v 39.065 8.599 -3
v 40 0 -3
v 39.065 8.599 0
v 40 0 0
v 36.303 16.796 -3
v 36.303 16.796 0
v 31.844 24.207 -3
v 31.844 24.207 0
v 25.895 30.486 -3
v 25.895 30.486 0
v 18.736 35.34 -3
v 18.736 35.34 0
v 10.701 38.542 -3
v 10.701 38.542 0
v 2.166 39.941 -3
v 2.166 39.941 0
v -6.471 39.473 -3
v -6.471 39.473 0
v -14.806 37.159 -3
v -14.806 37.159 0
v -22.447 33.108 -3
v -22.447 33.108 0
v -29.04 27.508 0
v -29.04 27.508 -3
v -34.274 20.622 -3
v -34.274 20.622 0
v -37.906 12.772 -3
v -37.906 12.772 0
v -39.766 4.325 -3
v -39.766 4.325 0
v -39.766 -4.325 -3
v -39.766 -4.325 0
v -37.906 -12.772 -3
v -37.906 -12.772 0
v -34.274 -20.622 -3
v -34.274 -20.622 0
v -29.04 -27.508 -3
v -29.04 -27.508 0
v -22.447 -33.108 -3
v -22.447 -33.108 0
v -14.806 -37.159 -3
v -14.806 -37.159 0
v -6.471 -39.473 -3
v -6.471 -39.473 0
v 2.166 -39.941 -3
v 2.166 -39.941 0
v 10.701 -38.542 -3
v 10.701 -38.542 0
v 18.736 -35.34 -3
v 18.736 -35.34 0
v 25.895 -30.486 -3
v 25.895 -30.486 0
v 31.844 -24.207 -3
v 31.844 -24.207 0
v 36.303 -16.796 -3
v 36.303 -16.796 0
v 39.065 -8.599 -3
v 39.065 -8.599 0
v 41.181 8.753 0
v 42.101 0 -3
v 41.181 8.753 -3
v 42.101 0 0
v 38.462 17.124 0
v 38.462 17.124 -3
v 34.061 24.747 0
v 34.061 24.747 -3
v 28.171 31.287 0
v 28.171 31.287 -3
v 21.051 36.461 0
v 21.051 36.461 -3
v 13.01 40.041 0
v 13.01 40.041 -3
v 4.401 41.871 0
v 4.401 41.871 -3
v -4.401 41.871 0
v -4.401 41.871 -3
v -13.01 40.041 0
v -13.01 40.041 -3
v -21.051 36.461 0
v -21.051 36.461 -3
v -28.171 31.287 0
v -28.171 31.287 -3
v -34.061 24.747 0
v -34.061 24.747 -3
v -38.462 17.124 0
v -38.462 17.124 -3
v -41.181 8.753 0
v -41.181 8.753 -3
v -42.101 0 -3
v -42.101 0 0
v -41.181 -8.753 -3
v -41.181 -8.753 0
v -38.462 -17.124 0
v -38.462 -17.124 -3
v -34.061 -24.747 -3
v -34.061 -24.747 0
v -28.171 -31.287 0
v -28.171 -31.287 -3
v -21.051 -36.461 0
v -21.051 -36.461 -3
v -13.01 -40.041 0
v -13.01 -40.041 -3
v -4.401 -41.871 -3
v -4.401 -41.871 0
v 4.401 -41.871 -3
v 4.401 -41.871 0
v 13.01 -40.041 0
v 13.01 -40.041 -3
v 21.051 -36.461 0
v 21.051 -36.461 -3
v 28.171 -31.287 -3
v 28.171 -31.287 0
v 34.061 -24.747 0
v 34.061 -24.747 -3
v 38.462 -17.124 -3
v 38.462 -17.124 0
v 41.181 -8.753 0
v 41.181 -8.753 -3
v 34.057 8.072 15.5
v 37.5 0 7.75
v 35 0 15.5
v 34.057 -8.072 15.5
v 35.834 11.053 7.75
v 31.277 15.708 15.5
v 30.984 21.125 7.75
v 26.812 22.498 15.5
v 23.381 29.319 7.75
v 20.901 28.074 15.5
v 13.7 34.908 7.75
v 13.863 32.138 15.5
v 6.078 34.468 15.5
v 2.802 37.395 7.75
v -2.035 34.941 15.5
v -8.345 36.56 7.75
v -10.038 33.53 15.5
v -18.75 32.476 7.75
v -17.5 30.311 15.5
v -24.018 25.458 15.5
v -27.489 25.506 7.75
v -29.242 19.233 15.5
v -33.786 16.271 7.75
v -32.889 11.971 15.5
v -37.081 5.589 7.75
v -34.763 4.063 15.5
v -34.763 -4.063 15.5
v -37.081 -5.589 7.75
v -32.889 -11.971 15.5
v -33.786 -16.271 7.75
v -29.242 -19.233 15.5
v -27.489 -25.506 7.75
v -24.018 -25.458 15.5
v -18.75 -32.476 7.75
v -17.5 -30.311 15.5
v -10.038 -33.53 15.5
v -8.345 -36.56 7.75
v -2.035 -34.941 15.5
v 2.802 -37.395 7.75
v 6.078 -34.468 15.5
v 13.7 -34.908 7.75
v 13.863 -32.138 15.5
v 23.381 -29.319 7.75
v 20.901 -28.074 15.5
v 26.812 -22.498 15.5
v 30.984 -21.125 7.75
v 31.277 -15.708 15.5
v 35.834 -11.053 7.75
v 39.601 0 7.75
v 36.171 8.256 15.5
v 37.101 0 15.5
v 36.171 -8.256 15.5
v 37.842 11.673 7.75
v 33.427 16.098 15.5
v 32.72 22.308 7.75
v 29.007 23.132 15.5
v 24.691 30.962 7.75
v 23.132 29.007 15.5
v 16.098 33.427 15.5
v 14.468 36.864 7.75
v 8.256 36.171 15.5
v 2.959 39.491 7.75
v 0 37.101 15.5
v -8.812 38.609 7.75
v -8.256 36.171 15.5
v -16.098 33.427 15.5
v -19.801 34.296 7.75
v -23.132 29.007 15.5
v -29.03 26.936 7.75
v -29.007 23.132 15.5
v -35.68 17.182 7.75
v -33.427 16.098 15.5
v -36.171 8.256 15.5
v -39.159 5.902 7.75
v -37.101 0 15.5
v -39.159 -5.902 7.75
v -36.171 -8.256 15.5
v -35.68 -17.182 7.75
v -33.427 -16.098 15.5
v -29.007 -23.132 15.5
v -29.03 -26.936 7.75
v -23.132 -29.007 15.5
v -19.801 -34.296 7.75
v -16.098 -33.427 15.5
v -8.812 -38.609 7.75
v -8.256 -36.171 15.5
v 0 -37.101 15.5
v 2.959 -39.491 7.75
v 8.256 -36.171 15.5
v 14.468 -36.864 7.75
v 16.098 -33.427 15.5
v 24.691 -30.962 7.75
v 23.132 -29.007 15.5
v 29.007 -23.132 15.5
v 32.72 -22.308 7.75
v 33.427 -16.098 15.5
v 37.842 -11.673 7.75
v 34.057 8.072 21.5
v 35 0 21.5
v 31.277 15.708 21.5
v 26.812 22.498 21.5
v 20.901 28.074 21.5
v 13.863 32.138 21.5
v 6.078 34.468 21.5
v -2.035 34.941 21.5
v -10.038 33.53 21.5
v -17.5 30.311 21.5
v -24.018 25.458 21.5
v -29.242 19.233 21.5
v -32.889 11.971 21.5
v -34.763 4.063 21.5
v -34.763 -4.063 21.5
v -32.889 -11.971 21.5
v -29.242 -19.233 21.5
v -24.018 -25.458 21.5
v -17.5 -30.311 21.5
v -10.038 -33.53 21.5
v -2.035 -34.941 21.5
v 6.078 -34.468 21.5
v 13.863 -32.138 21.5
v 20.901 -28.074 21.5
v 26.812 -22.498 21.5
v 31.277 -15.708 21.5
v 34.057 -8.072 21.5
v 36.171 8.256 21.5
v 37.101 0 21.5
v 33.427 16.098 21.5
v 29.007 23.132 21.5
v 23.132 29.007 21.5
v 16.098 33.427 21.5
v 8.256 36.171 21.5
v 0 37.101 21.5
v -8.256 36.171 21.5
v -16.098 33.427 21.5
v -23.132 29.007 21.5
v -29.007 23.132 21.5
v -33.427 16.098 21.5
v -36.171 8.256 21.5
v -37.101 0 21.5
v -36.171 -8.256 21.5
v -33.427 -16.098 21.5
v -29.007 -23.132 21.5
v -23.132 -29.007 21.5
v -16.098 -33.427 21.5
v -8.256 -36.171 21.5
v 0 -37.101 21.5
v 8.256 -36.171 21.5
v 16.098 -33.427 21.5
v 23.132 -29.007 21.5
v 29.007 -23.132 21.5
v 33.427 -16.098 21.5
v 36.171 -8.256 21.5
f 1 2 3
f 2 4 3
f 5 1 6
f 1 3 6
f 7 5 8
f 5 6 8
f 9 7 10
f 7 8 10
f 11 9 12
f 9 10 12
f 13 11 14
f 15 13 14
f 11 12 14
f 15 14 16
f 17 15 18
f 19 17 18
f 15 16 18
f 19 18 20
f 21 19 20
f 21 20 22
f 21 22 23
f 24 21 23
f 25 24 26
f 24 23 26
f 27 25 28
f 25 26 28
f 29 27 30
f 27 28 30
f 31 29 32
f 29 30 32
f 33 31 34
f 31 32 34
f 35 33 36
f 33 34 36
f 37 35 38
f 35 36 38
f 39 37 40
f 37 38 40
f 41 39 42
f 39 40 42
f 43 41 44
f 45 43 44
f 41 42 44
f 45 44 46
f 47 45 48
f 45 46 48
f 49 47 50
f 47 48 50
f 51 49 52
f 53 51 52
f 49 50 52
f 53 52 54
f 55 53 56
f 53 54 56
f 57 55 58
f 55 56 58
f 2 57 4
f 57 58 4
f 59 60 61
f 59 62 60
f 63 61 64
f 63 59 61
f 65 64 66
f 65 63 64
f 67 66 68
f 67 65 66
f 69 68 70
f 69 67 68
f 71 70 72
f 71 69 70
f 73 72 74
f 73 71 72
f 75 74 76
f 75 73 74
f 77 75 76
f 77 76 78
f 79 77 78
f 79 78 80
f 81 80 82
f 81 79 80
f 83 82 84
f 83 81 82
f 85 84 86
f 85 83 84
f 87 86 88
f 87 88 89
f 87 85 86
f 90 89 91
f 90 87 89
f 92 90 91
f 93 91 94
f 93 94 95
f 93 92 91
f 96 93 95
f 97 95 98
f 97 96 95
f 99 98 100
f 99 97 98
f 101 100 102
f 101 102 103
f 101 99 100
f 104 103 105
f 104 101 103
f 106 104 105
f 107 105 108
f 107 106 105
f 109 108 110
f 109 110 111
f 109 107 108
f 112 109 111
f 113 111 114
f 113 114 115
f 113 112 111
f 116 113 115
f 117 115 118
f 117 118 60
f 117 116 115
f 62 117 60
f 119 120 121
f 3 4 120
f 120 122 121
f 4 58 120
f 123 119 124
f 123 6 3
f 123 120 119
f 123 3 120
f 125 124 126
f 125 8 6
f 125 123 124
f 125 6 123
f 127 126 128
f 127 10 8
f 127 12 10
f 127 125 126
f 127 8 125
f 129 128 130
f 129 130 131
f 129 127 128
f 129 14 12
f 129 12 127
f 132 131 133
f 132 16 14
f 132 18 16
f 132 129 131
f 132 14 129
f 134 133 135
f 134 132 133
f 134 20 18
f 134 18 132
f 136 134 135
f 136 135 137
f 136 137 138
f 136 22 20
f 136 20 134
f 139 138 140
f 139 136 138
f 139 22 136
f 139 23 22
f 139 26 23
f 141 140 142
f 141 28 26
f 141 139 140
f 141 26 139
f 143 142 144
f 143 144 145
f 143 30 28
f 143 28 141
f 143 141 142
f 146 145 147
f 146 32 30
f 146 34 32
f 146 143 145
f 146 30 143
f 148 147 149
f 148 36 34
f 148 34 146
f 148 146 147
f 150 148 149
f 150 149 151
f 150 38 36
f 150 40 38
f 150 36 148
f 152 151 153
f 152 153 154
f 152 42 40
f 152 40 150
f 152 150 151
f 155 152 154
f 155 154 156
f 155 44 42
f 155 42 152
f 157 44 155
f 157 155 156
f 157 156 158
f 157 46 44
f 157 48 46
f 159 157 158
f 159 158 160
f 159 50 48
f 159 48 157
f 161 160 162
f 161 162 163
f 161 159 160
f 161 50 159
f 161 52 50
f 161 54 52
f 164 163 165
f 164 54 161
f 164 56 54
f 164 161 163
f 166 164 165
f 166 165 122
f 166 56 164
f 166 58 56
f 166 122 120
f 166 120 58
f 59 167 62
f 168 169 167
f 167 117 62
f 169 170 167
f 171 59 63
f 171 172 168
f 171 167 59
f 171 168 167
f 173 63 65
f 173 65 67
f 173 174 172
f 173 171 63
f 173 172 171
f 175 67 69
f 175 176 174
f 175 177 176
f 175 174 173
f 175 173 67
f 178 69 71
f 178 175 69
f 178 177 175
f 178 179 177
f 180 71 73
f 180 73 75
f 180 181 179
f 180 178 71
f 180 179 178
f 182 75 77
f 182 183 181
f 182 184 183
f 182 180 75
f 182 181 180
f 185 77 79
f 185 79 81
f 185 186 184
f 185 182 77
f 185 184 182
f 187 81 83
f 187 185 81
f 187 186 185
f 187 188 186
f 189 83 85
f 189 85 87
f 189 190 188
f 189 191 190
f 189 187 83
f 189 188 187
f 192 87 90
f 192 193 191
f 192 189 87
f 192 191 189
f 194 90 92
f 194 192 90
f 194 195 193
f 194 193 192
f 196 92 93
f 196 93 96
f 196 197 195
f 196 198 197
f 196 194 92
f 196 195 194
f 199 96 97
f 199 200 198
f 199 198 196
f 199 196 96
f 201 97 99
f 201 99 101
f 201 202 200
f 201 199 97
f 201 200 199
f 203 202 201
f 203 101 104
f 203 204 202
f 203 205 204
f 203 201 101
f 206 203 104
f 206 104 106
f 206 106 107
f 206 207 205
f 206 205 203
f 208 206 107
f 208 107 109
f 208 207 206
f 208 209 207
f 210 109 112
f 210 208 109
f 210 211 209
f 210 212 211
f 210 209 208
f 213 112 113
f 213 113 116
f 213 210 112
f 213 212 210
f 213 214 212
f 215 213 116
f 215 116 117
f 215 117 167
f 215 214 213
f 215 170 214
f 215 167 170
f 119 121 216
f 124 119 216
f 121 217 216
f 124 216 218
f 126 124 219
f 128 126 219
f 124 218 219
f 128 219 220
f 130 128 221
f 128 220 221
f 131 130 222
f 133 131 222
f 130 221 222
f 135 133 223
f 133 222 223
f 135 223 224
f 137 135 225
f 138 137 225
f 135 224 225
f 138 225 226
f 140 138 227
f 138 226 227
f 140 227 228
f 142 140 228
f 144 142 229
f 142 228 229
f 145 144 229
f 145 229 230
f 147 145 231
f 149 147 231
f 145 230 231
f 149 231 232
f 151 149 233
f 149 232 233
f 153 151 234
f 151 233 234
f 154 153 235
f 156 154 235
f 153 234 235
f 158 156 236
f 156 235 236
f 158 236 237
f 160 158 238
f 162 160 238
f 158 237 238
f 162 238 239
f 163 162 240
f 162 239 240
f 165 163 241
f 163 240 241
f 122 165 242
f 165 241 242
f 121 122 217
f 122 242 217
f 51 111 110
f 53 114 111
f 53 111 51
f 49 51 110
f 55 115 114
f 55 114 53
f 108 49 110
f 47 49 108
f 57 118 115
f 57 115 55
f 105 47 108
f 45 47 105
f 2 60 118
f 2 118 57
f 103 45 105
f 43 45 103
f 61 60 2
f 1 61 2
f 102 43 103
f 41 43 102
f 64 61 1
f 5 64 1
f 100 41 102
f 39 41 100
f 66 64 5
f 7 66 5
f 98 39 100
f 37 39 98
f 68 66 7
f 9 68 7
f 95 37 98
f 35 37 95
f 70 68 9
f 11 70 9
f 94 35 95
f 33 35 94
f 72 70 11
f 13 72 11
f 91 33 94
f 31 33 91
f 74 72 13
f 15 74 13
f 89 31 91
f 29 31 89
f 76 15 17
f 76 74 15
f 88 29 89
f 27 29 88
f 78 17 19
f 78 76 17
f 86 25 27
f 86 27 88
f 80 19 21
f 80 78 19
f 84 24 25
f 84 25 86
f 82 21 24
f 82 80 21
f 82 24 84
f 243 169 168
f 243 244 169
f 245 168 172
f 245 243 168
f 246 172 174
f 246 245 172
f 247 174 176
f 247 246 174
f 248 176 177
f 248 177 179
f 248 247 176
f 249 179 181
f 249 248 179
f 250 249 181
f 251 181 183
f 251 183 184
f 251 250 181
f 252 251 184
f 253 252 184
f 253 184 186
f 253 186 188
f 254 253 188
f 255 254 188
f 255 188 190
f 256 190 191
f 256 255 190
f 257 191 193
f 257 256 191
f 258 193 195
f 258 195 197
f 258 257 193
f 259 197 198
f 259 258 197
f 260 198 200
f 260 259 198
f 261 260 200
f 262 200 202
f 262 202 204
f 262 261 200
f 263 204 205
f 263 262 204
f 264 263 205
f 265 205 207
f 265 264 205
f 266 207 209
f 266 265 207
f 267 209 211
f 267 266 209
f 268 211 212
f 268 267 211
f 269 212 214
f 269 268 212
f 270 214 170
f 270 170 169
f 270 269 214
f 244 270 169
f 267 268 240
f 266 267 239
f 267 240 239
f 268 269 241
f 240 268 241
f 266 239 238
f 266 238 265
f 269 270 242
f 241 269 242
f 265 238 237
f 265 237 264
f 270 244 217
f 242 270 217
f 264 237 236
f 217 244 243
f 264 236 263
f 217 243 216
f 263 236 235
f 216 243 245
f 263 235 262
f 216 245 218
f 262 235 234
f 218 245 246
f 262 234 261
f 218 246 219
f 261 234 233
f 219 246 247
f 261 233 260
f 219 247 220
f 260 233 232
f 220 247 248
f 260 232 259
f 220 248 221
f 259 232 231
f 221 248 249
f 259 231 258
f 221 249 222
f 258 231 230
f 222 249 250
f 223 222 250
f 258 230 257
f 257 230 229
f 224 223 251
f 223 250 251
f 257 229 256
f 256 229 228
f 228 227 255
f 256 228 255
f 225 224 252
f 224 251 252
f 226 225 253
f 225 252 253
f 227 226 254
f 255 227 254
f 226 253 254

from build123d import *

# Parameters (mm, degrees)
F0_W   = 2.101484
F0_H   = 6
F0_H_2 = 3


with BuildPart() as f1:
    # F0 (on Front) → F1 (revolve)
    with BuildSketch(Plane.XZ):
        with Locations((36.050742, 18.5)):
            Rectangle(F0_W, F0_H)
        Polygon((35, 15.5), (40, 0), (42.101484, 0), (37.101484, 15.5), align=None)
        with Locations((41.050742, -1.5)):
            Rectangle(F0_W, F0_H_2)
    revolve(axis=Axis((0, 0, 7.75), (0, 0, 1)))


solid = f1.part
